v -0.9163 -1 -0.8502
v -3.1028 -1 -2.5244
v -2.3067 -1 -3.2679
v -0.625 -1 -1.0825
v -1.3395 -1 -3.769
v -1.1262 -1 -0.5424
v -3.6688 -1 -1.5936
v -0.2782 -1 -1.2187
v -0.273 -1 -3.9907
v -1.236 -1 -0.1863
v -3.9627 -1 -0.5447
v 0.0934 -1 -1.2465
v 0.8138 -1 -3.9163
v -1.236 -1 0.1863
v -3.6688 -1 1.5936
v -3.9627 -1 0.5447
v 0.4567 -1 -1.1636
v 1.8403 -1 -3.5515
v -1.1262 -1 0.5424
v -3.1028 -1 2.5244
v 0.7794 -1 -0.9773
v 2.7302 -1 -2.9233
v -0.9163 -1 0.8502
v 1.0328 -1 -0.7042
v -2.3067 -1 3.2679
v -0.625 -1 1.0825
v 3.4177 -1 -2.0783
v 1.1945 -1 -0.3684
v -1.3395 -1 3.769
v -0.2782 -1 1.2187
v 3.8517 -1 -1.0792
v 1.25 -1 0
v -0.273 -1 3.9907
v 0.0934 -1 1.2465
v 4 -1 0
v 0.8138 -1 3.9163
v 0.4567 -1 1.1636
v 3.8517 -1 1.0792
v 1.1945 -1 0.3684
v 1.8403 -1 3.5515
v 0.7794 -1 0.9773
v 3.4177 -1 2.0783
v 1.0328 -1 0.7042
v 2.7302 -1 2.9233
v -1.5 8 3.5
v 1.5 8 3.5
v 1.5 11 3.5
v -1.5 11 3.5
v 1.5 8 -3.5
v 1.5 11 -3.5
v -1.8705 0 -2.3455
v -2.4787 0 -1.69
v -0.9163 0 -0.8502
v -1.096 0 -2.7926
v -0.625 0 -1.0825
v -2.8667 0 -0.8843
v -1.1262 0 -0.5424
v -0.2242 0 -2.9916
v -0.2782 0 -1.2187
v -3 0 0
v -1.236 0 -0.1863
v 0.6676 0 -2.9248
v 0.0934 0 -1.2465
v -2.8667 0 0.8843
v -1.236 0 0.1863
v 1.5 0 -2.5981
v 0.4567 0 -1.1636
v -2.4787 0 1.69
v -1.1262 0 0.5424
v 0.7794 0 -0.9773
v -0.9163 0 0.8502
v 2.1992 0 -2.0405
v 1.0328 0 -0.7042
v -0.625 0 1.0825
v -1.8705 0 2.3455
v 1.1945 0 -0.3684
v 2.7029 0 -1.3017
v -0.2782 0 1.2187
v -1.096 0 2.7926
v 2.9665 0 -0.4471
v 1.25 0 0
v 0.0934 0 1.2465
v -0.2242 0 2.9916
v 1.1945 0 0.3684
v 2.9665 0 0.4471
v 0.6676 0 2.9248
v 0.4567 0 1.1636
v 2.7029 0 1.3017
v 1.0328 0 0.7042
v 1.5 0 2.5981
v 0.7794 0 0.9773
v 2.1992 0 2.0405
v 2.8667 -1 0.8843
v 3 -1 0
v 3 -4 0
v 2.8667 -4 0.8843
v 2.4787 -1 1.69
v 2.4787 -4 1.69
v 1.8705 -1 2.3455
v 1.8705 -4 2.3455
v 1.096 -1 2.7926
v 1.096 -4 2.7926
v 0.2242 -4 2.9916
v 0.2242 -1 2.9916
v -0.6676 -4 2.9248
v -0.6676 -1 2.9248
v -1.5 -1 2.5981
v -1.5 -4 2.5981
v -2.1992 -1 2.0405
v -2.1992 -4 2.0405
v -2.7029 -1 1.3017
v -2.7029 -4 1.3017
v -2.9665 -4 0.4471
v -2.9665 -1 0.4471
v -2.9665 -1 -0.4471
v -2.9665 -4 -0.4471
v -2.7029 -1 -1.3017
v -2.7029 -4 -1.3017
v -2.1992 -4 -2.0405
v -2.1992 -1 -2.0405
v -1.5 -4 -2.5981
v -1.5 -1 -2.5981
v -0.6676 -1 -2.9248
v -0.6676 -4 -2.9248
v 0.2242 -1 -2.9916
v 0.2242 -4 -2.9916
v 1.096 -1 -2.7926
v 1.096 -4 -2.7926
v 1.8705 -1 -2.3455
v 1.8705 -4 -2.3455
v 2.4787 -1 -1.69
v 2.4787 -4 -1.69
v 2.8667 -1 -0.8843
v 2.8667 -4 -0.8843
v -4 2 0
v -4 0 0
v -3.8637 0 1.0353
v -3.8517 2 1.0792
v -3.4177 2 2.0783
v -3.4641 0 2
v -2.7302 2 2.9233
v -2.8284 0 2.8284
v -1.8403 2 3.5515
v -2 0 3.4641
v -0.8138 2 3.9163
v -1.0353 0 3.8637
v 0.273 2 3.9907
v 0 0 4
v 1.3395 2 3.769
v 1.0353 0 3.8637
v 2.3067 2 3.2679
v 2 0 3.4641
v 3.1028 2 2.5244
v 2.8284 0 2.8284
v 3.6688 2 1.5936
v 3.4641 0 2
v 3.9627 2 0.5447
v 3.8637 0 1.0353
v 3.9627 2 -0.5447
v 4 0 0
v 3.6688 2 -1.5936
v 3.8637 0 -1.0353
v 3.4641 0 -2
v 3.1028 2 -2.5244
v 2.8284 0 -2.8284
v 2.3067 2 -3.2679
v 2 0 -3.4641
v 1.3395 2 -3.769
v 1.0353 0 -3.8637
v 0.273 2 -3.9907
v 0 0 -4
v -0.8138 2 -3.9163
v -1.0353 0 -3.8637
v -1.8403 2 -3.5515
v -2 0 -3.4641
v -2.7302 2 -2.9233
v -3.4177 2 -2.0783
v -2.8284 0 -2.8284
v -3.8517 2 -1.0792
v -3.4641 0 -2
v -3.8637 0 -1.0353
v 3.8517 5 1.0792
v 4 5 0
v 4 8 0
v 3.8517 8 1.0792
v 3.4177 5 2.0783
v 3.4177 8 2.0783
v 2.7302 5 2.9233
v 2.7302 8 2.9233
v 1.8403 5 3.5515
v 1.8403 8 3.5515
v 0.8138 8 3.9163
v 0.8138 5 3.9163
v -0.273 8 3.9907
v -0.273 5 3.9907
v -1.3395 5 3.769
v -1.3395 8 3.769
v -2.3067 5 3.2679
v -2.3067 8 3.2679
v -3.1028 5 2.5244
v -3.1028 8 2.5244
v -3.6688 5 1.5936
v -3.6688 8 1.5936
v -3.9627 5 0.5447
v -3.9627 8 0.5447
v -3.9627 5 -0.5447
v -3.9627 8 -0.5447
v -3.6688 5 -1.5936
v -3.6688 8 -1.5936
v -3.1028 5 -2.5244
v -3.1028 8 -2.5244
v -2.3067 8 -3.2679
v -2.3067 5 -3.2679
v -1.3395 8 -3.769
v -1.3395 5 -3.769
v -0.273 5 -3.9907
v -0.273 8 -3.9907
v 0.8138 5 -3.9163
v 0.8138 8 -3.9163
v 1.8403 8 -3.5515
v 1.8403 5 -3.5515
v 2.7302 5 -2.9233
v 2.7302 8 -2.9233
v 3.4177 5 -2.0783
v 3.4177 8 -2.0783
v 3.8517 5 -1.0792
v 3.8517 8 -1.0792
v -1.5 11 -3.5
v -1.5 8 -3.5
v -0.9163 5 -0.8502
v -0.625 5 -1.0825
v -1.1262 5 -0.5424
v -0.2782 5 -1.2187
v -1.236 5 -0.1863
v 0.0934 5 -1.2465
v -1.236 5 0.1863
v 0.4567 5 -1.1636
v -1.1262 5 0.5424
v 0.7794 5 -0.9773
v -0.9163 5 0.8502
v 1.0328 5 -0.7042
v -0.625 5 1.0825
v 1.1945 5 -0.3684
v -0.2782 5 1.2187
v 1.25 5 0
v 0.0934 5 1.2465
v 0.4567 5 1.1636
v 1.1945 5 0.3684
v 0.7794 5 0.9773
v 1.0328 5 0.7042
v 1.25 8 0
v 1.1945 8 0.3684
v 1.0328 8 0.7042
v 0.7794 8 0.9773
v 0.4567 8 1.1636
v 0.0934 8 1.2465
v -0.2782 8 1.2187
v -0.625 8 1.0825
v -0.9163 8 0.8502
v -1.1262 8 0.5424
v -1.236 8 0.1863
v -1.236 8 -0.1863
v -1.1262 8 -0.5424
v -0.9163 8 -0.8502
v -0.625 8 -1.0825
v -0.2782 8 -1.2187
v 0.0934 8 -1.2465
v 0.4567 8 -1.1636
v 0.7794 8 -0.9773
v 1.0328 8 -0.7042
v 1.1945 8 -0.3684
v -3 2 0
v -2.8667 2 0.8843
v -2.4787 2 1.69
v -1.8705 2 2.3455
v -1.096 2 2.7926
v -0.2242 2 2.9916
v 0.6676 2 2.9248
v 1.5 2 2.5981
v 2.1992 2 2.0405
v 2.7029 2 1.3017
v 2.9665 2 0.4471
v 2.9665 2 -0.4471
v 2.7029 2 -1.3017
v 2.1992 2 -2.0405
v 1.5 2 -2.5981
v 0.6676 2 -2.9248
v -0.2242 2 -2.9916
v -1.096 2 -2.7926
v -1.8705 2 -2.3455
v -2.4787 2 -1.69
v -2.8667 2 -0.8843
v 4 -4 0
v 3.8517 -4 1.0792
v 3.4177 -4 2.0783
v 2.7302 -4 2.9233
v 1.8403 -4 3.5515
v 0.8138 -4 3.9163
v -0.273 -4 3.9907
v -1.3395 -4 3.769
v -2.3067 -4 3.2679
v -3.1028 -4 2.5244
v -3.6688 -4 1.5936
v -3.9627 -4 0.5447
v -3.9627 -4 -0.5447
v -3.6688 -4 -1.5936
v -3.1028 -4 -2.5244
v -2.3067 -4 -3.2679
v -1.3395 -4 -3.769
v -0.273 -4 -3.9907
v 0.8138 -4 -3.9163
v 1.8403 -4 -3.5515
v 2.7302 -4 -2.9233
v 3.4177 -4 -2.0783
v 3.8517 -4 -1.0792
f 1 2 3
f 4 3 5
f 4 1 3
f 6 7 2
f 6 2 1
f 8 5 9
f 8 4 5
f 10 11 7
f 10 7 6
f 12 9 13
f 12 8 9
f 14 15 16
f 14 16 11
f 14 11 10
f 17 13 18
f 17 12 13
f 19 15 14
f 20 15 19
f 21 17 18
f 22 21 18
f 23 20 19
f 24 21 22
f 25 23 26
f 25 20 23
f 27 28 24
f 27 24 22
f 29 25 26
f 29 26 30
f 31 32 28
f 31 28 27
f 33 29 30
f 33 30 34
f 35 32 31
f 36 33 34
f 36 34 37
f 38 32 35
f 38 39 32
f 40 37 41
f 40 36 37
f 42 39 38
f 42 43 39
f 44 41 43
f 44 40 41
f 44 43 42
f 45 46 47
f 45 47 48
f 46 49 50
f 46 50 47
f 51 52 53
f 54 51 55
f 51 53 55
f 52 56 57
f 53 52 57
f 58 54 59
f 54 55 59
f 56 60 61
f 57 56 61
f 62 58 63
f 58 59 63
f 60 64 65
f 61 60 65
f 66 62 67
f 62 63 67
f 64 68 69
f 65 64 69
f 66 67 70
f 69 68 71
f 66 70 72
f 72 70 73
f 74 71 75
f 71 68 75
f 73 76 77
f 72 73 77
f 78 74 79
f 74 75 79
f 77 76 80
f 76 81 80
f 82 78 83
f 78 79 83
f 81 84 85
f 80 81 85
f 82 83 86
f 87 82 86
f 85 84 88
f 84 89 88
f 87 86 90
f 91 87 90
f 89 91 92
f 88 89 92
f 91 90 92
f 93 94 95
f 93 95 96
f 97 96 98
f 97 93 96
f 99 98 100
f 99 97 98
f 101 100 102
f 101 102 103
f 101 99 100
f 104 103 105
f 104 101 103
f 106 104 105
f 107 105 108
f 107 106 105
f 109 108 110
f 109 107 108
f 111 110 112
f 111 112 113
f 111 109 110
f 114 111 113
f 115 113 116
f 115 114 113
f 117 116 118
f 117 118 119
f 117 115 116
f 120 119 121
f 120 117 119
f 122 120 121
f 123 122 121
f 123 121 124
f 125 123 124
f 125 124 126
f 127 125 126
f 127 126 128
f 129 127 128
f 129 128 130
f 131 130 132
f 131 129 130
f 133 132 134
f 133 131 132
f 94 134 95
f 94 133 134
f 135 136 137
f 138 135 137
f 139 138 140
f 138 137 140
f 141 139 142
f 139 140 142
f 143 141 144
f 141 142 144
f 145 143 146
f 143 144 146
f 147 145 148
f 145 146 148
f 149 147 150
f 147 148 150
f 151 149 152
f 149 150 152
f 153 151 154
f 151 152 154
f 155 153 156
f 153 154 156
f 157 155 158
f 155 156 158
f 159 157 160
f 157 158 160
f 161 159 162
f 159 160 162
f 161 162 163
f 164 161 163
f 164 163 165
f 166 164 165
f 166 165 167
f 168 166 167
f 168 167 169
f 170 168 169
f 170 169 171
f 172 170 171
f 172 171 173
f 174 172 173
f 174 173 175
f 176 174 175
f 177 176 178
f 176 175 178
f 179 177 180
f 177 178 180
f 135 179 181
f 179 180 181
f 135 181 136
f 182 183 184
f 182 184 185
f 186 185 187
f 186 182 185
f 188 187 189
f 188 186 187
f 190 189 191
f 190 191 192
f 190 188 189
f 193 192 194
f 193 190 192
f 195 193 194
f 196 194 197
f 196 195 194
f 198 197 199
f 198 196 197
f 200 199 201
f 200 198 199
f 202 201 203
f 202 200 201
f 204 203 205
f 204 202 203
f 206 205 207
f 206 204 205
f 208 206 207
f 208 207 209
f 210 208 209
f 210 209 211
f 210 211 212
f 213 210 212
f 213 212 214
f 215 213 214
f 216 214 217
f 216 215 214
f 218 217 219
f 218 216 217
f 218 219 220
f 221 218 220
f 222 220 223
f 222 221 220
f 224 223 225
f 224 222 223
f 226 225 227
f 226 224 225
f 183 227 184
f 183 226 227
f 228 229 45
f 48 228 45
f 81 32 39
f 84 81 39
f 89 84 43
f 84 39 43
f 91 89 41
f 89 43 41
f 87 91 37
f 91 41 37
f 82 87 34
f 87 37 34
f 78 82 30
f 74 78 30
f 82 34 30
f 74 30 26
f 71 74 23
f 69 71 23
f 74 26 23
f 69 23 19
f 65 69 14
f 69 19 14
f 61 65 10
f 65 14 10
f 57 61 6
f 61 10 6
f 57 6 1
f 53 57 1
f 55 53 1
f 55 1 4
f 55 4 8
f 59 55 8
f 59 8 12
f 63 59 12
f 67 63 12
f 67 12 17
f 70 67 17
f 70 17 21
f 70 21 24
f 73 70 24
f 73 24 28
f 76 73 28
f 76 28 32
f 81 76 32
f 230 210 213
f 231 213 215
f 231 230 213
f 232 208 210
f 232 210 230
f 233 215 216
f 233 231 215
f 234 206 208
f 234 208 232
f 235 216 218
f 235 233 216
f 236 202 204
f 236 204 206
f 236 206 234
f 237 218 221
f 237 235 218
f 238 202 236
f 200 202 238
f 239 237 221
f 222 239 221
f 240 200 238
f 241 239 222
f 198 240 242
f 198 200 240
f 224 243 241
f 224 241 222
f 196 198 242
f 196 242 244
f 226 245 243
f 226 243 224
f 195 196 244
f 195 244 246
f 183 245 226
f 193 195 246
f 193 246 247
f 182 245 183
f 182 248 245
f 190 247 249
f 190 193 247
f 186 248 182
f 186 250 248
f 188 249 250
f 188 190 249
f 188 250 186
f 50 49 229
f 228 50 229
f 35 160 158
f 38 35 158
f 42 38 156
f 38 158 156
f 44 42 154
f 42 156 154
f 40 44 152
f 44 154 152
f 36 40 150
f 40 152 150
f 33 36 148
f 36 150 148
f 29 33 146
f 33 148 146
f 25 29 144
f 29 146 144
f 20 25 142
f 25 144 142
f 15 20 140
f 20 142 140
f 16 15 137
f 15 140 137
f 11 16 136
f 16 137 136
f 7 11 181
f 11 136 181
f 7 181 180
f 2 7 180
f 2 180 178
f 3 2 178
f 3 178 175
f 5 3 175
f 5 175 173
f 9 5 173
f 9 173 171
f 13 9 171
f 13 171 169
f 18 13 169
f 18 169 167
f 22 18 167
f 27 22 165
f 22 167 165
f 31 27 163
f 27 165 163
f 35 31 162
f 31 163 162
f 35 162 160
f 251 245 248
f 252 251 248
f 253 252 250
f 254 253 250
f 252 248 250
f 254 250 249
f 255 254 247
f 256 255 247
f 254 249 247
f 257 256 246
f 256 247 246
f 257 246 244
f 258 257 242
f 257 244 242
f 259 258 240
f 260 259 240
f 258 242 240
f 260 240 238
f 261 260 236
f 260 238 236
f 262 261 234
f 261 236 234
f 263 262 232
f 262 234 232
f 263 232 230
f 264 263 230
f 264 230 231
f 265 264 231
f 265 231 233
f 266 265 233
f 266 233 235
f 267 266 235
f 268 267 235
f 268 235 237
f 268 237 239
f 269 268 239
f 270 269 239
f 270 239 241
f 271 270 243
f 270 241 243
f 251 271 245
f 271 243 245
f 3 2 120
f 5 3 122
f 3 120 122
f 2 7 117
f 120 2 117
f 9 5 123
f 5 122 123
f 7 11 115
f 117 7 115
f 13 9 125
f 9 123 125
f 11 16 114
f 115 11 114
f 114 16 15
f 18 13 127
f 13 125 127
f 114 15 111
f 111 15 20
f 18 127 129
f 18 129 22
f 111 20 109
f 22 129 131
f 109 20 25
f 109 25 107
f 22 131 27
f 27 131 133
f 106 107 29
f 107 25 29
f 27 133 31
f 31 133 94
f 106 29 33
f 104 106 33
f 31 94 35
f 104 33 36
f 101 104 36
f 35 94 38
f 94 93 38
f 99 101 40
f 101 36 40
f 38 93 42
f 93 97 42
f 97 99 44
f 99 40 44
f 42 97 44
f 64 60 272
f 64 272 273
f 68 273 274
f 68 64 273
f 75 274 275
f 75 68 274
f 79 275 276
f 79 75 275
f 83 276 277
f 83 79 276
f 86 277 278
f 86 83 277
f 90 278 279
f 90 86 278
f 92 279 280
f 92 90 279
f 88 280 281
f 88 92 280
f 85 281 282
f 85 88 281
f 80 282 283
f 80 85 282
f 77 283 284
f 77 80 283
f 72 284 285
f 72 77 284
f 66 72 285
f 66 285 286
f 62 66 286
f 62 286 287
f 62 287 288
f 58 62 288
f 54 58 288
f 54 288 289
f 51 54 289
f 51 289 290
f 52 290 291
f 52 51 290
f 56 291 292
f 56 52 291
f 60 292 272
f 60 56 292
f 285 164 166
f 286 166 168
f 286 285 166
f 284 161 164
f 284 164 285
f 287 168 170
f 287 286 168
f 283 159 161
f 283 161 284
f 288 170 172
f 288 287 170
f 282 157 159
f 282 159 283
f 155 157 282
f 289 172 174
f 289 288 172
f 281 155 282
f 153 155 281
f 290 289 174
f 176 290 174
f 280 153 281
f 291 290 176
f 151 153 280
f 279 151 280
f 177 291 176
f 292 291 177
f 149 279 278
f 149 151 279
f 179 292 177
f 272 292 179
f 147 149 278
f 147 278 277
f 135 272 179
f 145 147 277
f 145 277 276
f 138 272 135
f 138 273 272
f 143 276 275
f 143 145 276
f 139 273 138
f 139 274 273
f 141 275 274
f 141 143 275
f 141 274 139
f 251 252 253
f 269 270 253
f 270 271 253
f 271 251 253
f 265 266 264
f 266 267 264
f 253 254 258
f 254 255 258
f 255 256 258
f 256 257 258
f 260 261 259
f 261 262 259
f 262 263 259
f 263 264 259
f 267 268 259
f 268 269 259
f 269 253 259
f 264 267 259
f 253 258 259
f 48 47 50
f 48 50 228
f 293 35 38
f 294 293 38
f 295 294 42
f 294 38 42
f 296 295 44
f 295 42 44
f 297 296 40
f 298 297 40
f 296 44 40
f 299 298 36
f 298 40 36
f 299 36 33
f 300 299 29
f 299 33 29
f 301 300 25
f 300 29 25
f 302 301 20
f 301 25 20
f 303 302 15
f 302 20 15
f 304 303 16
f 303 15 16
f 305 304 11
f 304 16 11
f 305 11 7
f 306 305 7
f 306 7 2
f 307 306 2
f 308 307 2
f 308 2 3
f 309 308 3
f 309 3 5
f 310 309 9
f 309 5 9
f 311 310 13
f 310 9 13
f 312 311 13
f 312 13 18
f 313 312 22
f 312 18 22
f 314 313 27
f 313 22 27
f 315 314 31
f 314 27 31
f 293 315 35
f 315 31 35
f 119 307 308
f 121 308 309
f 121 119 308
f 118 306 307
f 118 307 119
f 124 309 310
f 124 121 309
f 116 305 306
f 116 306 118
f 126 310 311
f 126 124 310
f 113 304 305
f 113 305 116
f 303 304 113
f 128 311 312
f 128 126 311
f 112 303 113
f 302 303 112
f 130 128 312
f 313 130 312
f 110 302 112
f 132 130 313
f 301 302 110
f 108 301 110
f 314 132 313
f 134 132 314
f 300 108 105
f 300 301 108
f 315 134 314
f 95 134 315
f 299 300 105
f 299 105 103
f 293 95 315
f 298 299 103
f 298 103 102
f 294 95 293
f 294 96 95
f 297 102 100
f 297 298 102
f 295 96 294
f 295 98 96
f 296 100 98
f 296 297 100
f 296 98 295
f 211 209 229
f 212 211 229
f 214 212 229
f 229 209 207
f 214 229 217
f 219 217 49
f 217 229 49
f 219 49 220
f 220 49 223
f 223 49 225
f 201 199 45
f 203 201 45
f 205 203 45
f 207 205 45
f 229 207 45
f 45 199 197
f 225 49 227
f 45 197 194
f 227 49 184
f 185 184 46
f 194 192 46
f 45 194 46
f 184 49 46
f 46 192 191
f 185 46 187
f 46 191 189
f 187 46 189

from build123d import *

# Parameters (mm, degrees)
F0_R      = 4
F1_DEPTH  = 1
F2_R      = 4
F2_R_2    = 3
F3_DEPTH  = 2
F4_R      = 1.25
F5_DEPTH  = 25
F6_R      = 4
F6_R_2    = 3
F7_DEPTH  = 3
F9_R      = 4
F10_DEPTH = 3
F12_R     = 1.25
F13_DEPTH = 3
F14_W     = 3
F14_H     = 7
F15_DEPTH = 3


with BuildPart() as f1:
    # F0 (on Front) → F1 (new body)
    with BuildSketch(Plane.XZ):
        Circle(F0_R)
    extrude(amount=F1_DEPTH)

    # F2 (on face) → F3 (join)
    with BuildSketch(Plane(origin=(0, 0, 0), x_dir=(-1, 0, 0), z_dir=(0, 1, 0))):
        Circle(F2_R)
        Circle(F2_R_2, mode=Mode.SUBTRACT)
    extrude(amount=F3_DEPTH)

    # F4 (on face) → F5 (cut)
    with BuildSketch(Plane.XZ.offset(1)):
        Circle(F4_R)
    extrude(amount=-F5_DEPTH, mode=Mode.SUBTRACT)


with BuildPart() as f7:
    # F6 (on face) → F7 (new body)
    with BuildSketch(Plane.XZ.offset(1)):
        Circle(F6_R)
        Circle(F6_R_2, mode=Mode.SUBTRACT)
    extrude(amount=F7_DEPTH)


with BuildPart() as f10:
    # F9 (on offset) → F10 (new body)
    with BuildSketch(Plane.XZ.offset(-5)):
        Circle(F9_R)
    extrude(amount=-F10_DEPTH)

    # F12 (on offset) → F13 (cut)
    with BuildSketch(Plane.XZ.offset(-5)):
        Circle(F12_R)
    extrude(amount=-F13_DEPTH, mode=Mode.SUBTRACT)

    # F14 (on face) → F15 (join)
    with BuildSketch(Plane(origin=(0, 8, 0), x_dir=(-1, 0, 0), z_dir=(0, 1, 0))):
        Rectangle(F14_W, F14_H)
    extrude(amount=F15_DEPTH)


solid = Compound([f1.part, f7.part, f10.part])
